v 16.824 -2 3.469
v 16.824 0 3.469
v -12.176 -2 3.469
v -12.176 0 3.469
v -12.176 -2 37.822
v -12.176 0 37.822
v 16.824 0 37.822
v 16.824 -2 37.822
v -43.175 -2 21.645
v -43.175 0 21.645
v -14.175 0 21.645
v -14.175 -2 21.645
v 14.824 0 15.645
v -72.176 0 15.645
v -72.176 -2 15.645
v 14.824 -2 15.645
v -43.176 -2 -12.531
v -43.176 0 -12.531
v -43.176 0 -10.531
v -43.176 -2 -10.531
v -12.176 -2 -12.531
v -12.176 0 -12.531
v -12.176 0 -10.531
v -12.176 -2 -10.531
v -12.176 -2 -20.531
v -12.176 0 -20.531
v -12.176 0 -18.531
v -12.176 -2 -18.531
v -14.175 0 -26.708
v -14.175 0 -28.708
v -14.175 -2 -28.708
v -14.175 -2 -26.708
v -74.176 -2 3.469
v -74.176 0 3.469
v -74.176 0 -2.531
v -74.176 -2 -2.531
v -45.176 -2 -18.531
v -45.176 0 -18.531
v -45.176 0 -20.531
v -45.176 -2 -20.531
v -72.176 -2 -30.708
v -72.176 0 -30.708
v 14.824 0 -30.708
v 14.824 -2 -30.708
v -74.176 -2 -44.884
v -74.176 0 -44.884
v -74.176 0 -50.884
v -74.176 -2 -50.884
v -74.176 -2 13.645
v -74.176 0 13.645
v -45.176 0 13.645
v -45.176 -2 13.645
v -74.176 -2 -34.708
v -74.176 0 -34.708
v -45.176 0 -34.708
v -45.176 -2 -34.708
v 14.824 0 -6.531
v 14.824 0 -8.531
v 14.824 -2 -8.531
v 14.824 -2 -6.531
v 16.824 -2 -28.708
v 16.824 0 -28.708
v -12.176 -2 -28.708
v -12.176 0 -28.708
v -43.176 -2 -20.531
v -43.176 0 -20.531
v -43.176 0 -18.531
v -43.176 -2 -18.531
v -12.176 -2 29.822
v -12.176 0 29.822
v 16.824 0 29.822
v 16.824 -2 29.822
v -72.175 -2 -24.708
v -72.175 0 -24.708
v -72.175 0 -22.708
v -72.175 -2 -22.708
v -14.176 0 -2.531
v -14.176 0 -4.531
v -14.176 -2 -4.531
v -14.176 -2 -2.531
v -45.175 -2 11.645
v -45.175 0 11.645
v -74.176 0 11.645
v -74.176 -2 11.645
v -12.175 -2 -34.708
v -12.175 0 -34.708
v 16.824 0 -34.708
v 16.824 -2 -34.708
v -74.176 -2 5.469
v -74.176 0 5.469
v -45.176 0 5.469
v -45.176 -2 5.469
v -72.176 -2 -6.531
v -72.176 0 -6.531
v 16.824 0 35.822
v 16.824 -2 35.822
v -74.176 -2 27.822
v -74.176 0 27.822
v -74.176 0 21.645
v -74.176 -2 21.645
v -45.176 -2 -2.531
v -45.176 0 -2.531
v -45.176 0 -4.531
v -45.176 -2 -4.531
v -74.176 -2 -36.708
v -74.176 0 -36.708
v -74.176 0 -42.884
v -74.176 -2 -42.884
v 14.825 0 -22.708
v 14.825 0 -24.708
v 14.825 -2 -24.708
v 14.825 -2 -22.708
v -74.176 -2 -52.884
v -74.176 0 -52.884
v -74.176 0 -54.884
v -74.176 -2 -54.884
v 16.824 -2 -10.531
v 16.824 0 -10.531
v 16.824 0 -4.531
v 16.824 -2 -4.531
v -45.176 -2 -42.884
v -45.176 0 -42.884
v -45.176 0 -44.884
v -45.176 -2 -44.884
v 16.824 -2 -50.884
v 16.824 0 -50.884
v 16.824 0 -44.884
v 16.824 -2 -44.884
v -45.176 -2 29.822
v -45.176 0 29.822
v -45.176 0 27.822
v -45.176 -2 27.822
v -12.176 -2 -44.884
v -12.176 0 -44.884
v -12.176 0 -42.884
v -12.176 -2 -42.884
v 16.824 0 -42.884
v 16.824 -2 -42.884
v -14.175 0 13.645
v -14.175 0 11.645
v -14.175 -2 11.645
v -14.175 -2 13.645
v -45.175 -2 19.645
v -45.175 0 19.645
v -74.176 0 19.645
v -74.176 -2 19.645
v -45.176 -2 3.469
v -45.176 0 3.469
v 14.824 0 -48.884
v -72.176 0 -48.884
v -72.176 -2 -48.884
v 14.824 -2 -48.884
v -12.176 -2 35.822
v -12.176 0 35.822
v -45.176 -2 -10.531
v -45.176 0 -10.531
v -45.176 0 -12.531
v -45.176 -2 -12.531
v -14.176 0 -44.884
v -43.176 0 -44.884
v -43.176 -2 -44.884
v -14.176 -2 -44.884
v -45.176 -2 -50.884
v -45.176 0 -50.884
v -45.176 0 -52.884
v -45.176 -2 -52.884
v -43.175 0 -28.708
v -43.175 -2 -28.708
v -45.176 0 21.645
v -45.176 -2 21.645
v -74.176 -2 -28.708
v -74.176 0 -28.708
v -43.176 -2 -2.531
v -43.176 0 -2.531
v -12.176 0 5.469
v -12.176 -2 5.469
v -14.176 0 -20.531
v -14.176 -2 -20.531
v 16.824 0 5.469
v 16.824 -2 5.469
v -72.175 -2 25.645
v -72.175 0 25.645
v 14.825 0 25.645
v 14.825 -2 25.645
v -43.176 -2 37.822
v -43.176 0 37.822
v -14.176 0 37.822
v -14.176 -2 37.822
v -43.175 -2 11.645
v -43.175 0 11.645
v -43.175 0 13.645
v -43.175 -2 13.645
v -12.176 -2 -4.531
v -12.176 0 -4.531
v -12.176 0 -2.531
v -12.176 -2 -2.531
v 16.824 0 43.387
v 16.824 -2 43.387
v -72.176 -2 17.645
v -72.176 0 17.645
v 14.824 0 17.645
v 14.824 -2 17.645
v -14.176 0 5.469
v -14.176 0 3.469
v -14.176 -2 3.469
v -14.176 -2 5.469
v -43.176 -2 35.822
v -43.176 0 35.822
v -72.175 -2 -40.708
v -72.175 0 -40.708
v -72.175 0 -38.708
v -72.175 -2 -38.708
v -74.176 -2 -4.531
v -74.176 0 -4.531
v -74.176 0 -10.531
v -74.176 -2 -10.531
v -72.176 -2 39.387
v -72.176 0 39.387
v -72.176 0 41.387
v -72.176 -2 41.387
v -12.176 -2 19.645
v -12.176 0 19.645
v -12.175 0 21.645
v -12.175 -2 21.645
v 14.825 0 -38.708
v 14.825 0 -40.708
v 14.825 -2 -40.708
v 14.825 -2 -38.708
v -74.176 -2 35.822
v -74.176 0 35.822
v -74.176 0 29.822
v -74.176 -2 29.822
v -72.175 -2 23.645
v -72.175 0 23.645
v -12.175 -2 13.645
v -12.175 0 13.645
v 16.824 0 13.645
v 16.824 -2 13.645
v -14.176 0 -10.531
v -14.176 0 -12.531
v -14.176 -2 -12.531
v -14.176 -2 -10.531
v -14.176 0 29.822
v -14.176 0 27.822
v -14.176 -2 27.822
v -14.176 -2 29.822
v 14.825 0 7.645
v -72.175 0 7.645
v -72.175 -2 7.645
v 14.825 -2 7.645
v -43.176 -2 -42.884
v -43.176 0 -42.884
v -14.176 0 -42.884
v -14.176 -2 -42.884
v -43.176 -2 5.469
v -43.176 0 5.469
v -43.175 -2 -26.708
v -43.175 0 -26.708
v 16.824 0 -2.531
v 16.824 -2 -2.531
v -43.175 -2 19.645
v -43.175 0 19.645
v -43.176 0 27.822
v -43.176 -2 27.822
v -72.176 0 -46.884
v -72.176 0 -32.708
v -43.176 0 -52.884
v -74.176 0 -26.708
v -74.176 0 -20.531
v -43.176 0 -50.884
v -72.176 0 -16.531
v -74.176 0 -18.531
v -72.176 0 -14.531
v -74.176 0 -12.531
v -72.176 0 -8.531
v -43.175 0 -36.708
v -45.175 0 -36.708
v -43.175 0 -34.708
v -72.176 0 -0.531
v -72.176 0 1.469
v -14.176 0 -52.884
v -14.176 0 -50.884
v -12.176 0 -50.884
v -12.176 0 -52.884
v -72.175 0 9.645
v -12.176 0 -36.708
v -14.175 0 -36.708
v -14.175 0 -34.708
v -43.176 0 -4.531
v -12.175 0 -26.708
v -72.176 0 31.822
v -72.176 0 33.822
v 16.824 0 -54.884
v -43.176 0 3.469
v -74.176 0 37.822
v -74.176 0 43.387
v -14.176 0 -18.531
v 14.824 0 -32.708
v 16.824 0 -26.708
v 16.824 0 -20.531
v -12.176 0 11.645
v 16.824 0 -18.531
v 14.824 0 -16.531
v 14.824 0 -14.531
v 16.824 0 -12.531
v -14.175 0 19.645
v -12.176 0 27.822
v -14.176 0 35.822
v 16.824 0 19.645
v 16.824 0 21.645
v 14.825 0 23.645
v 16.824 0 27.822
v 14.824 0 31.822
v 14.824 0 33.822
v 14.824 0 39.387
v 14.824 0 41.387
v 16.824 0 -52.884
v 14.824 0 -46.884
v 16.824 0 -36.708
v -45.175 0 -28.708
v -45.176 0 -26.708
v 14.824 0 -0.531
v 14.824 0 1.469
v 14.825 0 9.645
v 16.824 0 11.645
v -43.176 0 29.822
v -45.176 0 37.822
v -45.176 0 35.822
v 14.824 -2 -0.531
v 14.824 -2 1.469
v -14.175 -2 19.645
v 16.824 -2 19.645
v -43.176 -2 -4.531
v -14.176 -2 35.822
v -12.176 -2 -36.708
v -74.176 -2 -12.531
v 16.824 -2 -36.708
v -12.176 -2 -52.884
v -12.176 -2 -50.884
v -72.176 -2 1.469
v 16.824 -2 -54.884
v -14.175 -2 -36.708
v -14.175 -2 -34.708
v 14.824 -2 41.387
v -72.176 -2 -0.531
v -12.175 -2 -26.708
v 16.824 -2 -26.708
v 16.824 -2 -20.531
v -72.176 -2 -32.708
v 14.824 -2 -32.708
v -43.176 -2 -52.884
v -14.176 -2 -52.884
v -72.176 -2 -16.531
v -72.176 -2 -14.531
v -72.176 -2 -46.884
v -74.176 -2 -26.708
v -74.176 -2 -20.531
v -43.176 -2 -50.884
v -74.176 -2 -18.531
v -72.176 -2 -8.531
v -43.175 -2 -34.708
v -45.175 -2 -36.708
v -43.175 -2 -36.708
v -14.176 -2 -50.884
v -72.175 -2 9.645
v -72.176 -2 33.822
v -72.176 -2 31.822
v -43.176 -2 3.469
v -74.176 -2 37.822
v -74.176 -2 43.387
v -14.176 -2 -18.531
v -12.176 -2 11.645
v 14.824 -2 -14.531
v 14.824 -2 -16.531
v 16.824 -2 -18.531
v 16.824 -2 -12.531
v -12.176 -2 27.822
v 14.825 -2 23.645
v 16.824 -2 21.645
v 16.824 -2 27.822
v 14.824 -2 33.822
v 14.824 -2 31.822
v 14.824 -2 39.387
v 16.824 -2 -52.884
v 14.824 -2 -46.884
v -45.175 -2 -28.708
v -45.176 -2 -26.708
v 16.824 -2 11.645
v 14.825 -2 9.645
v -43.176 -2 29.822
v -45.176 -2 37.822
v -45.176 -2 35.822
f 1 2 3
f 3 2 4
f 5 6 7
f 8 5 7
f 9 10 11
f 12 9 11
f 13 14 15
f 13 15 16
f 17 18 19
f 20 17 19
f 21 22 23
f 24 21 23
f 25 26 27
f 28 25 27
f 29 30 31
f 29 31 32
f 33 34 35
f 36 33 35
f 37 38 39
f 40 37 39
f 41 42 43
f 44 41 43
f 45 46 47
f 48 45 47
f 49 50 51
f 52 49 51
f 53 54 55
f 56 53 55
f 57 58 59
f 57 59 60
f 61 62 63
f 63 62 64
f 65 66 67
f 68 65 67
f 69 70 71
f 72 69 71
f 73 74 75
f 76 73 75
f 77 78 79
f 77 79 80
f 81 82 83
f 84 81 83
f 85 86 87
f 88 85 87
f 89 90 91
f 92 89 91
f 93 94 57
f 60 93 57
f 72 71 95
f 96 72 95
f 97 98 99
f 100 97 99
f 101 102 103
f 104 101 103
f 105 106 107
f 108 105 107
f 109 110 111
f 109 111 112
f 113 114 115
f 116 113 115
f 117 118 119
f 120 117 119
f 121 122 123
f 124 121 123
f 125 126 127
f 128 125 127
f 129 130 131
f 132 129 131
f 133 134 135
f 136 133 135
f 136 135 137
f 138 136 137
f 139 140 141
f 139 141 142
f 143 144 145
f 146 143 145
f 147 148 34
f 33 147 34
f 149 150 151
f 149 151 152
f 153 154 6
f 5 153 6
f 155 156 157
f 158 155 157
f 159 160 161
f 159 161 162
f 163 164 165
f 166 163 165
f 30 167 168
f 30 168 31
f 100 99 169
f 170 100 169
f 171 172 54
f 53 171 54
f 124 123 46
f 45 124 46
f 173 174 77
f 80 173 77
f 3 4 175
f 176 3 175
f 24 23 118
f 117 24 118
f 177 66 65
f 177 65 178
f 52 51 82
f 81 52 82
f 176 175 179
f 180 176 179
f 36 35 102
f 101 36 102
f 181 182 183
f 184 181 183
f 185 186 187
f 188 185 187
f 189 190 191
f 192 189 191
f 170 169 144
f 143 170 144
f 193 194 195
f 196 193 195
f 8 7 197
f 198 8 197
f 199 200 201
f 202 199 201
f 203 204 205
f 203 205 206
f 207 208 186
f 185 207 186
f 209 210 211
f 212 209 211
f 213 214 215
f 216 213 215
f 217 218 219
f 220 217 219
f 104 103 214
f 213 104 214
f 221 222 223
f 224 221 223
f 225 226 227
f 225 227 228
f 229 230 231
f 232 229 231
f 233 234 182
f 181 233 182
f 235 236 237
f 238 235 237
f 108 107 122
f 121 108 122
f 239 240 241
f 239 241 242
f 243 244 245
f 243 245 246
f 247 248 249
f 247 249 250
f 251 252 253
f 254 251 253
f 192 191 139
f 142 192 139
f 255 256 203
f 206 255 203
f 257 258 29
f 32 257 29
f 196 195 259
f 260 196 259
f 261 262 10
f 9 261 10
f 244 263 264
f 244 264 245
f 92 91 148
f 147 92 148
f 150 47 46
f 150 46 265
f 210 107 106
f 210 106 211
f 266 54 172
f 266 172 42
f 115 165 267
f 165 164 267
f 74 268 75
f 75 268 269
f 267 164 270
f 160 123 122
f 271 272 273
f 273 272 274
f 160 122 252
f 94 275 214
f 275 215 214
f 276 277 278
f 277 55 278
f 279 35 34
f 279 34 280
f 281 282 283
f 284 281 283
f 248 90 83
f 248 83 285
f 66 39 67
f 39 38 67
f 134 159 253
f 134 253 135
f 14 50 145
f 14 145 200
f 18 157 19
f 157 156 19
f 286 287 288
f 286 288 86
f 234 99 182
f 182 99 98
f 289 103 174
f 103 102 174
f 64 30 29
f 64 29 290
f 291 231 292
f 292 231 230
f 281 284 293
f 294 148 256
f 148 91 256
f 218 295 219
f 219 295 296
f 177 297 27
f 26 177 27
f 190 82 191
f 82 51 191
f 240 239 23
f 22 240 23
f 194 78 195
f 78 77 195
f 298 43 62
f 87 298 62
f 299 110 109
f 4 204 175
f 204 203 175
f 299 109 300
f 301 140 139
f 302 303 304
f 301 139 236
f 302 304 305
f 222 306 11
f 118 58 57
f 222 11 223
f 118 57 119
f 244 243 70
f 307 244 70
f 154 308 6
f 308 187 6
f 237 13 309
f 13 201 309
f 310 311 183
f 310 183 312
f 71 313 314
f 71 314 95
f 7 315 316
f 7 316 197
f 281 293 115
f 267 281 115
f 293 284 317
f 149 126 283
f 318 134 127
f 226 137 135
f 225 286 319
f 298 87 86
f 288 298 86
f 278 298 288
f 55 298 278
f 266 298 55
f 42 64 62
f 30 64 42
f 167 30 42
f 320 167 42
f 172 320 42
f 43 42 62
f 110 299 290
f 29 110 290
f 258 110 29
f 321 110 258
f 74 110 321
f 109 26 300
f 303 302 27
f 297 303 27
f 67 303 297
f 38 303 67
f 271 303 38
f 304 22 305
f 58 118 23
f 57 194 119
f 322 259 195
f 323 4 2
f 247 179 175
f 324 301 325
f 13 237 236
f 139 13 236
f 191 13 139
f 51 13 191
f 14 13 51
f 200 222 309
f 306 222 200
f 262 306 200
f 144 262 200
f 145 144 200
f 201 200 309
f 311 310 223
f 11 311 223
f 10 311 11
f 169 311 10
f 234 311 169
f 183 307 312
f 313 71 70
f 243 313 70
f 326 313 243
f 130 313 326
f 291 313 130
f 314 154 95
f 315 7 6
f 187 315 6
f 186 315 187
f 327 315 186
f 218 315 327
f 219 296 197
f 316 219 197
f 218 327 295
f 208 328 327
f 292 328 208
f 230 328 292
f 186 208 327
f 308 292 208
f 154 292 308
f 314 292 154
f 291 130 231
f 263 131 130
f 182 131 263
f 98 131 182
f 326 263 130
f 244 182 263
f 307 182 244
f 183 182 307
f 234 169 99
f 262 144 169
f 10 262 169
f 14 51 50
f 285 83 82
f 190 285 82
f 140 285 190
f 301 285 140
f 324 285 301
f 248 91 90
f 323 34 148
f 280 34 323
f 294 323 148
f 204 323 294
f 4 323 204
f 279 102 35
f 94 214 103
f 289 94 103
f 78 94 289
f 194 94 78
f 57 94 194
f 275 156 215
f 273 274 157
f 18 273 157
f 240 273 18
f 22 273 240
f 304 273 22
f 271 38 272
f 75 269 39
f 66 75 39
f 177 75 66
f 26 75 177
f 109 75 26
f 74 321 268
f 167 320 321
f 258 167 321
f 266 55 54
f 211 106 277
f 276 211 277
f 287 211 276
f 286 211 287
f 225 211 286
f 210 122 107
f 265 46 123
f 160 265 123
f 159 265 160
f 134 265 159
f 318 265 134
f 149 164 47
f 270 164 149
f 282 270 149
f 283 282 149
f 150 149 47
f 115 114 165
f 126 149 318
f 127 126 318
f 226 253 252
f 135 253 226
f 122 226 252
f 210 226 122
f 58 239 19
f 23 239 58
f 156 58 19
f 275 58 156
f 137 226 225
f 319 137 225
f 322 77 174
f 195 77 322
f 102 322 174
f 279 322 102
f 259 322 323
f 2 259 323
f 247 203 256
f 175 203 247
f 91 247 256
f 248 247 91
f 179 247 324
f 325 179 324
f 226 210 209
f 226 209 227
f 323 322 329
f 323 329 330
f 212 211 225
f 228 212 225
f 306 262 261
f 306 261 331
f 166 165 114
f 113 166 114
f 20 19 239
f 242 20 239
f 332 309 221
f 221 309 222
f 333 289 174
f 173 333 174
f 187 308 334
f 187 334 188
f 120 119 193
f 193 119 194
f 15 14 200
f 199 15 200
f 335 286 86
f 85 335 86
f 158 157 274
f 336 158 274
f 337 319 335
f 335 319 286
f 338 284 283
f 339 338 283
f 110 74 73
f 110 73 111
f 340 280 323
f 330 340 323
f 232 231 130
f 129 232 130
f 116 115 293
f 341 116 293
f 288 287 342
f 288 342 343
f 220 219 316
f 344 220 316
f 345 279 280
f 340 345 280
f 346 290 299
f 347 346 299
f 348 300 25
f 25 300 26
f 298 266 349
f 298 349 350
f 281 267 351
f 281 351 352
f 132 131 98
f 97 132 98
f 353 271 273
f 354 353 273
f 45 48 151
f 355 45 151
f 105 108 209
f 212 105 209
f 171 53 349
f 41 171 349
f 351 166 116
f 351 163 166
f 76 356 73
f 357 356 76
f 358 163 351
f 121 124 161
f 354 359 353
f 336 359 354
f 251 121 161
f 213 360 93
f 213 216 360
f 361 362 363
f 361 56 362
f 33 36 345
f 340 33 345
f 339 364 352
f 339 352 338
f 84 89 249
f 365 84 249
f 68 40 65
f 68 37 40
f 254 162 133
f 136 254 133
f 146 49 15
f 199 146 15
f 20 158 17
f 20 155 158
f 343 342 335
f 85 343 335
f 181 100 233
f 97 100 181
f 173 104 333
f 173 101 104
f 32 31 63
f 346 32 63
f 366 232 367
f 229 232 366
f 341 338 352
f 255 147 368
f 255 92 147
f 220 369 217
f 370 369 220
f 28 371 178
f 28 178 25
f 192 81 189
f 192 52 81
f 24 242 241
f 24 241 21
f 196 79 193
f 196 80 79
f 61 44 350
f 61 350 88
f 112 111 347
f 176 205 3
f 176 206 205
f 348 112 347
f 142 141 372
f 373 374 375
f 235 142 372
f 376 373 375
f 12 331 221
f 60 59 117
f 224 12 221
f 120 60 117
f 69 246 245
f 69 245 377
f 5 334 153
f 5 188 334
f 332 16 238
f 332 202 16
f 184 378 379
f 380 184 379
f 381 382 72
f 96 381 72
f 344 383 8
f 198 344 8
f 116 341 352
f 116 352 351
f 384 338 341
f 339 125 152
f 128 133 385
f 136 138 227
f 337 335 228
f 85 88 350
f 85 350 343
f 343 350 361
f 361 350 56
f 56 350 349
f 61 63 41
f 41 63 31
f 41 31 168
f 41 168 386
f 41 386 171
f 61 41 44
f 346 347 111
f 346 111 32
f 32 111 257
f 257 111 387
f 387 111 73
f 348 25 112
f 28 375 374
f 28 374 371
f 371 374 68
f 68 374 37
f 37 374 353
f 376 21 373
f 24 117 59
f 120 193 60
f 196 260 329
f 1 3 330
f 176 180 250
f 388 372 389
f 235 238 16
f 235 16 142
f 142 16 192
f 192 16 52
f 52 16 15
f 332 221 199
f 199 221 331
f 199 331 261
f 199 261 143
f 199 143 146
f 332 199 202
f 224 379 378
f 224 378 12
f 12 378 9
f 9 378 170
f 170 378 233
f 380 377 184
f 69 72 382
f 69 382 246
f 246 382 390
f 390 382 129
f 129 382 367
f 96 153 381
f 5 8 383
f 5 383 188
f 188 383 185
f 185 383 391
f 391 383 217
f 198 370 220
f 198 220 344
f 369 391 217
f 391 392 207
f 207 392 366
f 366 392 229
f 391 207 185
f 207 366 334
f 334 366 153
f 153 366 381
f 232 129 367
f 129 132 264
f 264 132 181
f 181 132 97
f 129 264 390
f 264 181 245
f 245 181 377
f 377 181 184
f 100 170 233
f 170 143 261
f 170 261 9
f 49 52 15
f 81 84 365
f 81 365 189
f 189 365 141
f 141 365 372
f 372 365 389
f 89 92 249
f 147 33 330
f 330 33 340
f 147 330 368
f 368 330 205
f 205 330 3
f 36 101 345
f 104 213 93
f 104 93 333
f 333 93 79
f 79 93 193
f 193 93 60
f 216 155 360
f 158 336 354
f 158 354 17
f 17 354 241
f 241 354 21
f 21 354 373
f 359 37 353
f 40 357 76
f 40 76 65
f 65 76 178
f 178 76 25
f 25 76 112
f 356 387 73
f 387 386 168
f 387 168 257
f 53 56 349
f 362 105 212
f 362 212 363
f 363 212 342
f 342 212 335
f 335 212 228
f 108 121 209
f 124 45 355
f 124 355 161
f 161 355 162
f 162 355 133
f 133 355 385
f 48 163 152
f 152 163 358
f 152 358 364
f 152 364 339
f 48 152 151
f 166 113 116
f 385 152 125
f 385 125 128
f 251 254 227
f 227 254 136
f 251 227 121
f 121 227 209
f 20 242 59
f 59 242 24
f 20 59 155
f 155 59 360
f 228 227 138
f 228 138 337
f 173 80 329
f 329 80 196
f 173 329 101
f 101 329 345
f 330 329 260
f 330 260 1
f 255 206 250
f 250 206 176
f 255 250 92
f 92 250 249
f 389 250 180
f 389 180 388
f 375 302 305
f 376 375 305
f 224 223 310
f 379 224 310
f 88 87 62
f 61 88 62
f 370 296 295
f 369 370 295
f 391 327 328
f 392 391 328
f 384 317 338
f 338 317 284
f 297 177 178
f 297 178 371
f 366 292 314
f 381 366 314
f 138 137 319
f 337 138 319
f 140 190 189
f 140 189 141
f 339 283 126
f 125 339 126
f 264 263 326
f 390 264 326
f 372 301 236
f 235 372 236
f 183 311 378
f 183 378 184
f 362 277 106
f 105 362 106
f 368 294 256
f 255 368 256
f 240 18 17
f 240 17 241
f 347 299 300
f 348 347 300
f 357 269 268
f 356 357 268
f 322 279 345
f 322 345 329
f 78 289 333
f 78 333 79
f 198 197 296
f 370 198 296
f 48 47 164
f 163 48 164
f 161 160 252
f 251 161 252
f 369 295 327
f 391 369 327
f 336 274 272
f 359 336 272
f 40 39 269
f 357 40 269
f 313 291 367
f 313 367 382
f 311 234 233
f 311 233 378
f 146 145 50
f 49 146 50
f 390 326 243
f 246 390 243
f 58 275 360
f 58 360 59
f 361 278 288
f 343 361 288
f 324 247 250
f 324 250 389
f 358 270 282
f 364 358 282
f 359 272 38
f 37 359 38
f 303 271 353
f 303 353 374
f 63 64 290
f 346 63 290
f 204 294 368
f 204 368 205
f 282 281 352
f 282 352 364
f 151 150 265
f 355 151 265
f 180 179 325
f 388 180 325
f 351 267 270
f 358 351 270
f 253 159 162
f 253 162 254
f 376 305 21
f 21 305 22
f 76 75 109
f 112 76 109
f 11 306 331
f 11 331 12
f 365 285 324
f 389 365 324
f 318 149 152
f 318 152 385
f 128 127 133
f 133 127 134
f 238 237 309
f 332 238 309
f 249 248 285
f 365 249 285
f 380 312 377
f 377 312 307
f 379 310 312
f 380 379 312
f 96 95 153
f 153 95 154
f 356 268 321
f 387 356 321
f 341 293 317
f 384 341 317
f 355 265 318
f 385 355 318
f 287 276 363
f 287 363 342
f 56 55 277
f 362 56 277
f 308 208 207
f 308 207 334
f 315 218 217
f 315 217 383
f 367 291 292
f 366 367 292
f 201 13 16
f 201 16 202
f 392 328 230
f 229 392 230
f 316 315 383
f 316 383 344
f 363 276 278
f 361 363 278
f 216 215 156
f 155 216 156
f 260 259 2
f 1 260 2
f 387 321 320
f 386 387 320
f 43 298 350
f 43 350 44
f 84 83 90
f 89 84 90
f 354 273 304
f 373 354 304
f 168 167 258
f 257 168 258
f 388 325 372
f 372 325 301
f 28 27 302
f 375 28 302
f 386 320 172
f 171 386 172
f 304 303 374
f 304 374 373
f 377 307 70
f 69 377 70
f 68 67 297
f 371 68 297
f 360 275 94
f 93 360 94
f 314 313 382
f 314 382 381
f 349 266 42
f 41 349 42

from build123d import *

# Parameters (mm, degrees)
F0_W     = 87
F0_H     = 2
F0_W_2   = 29
F1_DEPTH = 2


# Not quite as in the source:
# - ends of sketch curves that miss each other by under 0.0002 mm in the source are joined


with BuildPart() as f1:
    # F0 (on Front) → F1 (new body)
    with BuildSketch(Plane.XZ):
        Polygon((-74.1755201817, -53.7046223087), (-74.1755201817, -54.8843706005), (16.8244798183, -54.8843706005), (16.8244798183, -52.8843706005), (-12.1755201817, -52.8843706005), (-12.1755201817, -50.8843706005), (16.8244798183, -50.8843706005), (16.8244798183, -44.8844749875), (-12.1755201817, -44.8844749875), (-12.1755201817, -42.8844749875), (16.8244798183, -42.8844749875), (16.8244798183, -36.7078750432), (-12.1755201817, -36.7078750432), (-12.1754285991, -34.7078750432), (16.8244798183, -34.7078750432), (16.8244798183, -28.7078750432), (-12.1755201817, -28.7078750432), (-12.1754285991, -26.7078750432), (16.8244798183, -26.7078750432), (16.8244798183, -20.5312750988), (-12.1755201817, -20.5312750988), (-12.1755201817, -18.5312750988), (16.8244798183, -18.5312750988), (16.8244798183, -12.5313794858), (-12.1755201817, -12.5313794858), (-12.1755201817, -10.5313794858), (16.8244798183, -10.5313794858), (16.8244798183, -4.5313794858), (-12.1755201817, -4.5313794858), (-12.1755201817, -2.5313794858), (16.8244798183, -2.5313794858), (16.8244798183, 3.4685161272), (-12.1755201817, 3.4685161272), (-12.1755201817, 5.4685161272), (16.8244798183, 5.4685161272), (16.8244798183, 11.6451160715), (-12.1755201817, 11.6451160715), (-12.1754285991, 13.6451160715), (16.8244798183, 13.6451160715), (16.8244798183, 19.6451160715), (-12.1755201817, 19.6451160715), (-12.1754285991, 21.6451160715), (16.8244798183, 21.6451160715), (16.8244798183, 27.8217160159), (-12.1755201817, 27.8217160159), (-12.1755201817, 29.8217160159), (16.8244798183, 29.8217160159), (16.8244798183, 35.8216116289), (-12.1755201817, 35.8216116289), (-12.1755201817, 37.8216116289), (16.8244798183, 37.8216116289), (16.8244798183, 43.3868200481), (-74.1755201817, 43.3868200481), (-74.1755201817, 37.8216116289), (-45.1755201817, 37.8216116289), (-45.1755201817, 35.8216116289), (-74.1755201817, 35.8216116289), (-74.1755201817, 29.8217160159), (-45.1755201817, 29.8217160159), (-45.1755201817, 27.8217160159), (-74.1755201817, 27.8217160159), (-74.1755201817, 21.6451160715), (-45.1755201817, 21.6451160715), (-45.1754285991, 19.6451160715), (-74.1755201817, 19.6451160715), (-74.1755201817, 13.6451160715), (-45.1755201817, 13.6451160715), (-45.1754285991, 11.6451160715), (-74.1755201817, 11.6451160715), (-74.1755201817, 5.4685161272), (-45.1755201817, 5.4685161272), (-45.1755201817, 3.4685161272), (-74.1755201817, 3.4685161272), (-74.1755201817, -2.5313794858), (-45.1755201817, -2.5313794858), (-45.1755201817, -4.5313794858), (-74.1755201817, -4.5313794858), (-74.1755201817, -10.5313794858), (-45.1755201817, -10.5313794858), (-45.1755201817, -12.5313794858), (-74.1755201817, -12.5313794858), (-74.1755201817, -18.5312750988), (-45.1755201817, -18.5312750988), (-45.1755201817, -20.5312750988), (-74.1755201817, -20.5312750988), (-74.1755201817, -26.7078750432), (-45.1755201817, -26.7078750432), (-45.1754285991, -28.7078750432), (-74.1755201817, -28.7078750432), (-74.1755201817, -34.7078750432), (-45.1755201817, -34.7078750432), (-45.1754285991, -36.7078750432), (-74.1755201817, -36.7078750432), (-74.1755201817, -42.8844749875), (-45.1755201817, -42.8844749875), (-45.1755201817, -44.8844749875), (-74.1755201817, -44.8844749875), (-74.1755201817, -50.8843706005), (-45.1755201817, -50.8843706005), (-45.1755201817, -52.8843706005), (-74.1755201817, -52.8843706005), align=None)
        with Locations((-28.6755201817, -47.8843706005)):
            Rectangle(F0_W, F0_H, mode=Mode.SUBTRACT)
        with Locations((-28.6755201817, -43.8844749875)):
            Rectangle(F0_W_2, F0_H, mode=Mode.SUBTRACT)
        with Locations((-28.6755201817, -31.7078686953)):
            Rectangle(F0_W, F0_H, mode=Mode.SUBTRACT)
        with Locations((-28.6755201817, -19.5312750988)):
            Rectangle(F0_W_2, F0_H, mode=Mode.SUBTRACT)
        with Locations((-28.6755201817, -15.5313794858)):
            Rectangle(F0_W, F0_H, mode=Mode.SUBTRACT)
        with Locations((-28.6755201817, -51.8843706005)):
            Rectangle(F0_W_2, F0_H, mode=Mode.SUBTRACT)
        with Locations((-28.6754285991, -39.7078750432)):
            Rectangle(F0_W, F0_H, mode=Mode.SUBTRACT)
        with Locations((-28.6754285991, -35.7078750432)):
            Rectangle(F0_W_2, F0_H, mode=Mode.SUBTRACT)
        with Locations((-28.6754285991, -27.7078750432)):
            Rectangle(F0_W_2, F0_H, mode=Mode.SUBTRACT)
        with Locations((-28.6754285991, -23.7078750432)):
            Rectangle(F0_W, F0_H, mode=Mode.SUBTRACT)
        with Locations((-28.6755201817, -11.5313794858)):
            Rectangle(F0_W_2, F0_H, mode=Mode.SUBTRACT)
        with Locations((-28.6755201817, -7.5313794858)):
            Rectangle(F0_W, F0_H, mode=Mode.SUBTRACT)
        with Locations((-28.6755201817, 0.4686205142)):
            Rectangle(F0_W, F0_H, mode=Mode.SUBTRACT)
        with Locations((-28.6755201817, 4.4685161272)):
            Rectangle(F0_W_2, F0_H, mode=Mode.SUBTRACT)
        with Locations((-28.6755201817, 16.6451224194)):
            Rectangle(F0_W, F0_H, mode=Mode.SUBTRACT)
        with Locations((-28.6755201817, 28.8217160159)):
            Rectangle(F0_W_2, F0_H, mode=Mode.SUBTRACT)
        with Locations((-28.6755201817, 32.8216116289)):
            Rectangle(F0_W, F0_H, mode=Mode.SUBTRACT)
        with Locations((-28.6755201817, 40.3868200481)):
            Rectangle(F0_W, F0_H, mode=Mode.SUBTRACT)
        with Locations((-28.6755201817, -3.5313794858)):
            Rectangle(F0_W_2, F0_H, mode=Mode.SUBTRACT)
        with Locations((-28.6754285991, 8.6451160715)):
            Rectangle(F0_W, F0_H, mode=Mode.SUBTRACT)
        with Locations((-28.6754285991, 12.6451160715)):
            Rectangle(F0_W_2, F0_H, mode=Mode.SUBTRACT)
        with Locations((-28.6754285991, 20.6451160715)):
            Rectangle(F0_W_2, F0_H, mode=Mode.SUBTRACT)
        with Locations((-28.6754285991, 24.6451160715)):
            Rectangle(F0_W, F0_H, mode=Mode.SUBTRACT)
        with Locations((-28.6755201817, 36.8216116289)):
            Rectangle(F0_W_2, F0_H, mode=Mode.SUBTRACT)
    extrude(amount=F1_DEPTH)


solid = f1.part
